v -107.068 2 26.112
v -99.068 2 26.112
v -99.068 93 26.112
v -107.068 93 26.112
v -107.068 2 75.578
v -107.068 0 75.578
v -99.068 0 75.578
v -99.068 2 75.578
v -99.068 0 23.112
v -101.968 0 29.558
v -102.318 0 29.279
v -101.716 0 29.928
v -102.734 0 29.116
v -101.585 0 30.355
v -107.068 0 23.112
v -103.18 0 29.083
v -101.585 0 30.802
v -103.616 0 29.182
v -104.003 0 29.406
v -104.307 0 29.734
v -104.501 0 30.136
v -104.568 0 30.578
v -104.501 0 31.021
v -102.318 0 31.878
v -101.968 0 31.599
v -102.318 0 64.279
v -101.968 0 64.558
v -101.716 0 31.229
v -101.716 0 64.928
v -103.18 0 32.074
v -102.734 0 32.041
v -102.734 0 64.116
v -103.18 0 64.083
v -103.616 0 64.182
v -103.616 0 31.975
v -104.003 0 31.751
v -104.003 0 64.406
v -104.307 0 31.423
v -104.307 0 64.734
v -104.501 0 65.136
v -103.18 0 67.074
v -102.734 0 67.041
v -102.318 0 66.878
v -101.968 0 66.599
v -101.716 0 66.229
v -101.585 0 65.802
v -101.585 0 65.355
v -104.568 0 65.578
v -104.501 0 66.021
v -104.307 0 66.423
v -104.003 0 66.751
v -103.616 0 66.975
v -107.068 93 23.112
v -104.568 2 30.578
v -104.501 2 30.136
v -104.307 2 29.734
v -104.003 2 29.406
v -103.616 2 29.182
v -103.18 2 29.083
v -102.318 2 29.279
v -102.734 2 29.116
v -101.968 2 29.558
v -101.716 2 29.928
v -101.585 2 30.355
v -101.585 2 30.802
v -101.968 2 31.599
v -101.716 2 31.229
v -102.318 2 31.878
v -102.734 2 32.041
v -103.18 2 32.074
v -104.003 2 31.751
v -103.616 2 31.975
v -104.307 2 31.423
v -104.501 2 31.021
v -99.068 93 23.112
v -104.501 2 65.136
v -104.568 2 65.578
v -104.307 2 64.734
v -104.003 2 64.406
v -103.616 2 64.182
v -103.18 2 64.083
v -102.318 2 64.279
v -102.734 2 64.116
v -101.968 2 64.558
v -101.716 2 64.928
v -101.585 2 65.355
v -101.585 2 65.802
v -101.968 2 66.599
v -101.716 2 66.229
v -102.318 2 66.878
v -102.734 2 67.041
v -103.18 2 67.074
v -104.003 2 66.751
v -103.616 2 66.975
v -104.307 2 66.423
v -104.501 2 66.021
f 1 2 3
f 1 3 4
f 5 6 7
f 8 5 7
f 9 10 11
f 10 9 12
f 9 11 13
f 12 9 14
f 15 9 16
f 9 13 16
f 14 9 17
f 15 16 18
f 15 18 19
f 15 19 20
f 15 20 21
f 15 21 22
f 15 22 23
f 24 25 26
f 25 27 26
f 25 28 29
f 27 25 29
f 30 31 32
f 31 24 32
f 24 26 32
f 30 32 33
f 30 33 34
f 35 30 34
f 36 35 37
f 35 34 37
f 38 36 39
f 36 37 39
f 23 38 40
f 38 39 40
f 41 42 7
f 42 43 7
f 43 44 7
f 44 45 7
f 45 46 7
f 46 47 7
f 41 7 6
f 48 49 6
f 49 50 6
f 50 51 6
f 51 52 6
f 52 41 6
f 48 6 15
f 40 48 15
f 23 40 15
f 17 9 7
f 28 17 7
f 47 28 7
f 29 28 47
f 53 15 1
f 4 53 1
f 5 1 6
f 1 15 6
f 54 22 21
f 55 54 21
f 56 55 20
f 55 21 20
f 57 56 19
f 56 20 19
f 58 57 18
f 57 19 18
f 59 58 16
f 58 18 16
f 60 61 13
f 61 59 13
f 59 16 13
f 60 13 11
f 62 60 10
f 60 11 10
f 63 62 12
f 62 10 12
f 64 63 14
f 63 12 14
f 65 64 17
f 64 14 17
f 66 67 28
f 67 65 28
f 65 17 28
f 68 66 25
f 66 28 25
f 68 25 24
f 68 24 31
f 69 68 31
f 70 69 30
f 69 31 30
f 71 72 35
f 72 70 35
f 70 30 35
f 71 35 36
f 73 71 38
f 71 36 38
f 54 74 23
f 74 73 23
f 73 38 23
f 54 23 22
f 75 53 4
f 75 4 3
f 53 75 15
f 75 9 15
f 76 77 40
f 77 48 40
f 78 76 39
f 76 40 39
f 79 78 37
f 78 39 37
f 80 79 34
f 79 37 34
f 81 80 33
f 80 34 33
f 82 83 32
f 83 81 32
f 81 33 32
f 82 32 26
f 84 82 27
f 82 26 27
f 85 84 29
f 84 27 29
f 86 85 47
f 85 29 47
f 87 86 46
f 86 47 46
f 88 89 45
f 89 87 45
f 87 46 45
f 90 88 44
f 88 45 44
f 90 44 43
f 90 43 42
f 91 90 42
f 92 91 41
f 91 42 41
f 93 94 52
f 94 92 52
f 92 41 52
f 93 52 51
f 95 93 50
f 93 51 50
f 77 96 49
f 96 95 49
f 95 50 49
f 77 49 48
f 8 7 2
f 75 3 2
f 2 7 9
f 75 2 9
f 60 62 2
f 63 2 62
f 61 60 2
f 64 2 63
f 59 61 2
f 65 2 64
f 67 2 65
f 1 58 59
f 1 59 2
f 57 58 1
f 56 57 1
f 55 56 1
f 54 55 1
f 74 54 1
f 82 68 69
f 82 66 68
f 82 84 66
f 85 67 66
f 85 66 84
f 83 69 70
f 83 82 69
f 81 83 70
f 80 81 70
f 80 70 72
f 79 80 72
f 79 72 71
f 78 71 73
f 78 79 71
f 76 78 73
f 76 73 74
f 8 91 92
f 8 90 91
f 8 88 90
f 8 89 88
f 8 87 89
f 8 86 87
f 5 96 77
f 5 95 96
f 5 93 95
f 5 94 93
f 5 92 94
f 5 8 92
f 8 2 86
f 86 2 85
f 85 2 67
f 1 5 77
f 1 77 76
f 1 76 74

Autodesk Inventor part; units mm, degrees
ref_plane "YZ Plane" through (0, 0, 0) normal (1, 0, 0) x (0, 1, 0)
ref_plane "XZ Plane" through (0, 0, 0) normal (0, 1, 0) x (-1, 0, 0)
ref_plane "XY Plane" through (0, 0, 0) normal (0, 0, 1) x (1, 0, 0)
sketch "Boceto1" plane through (0, 0, 0) normal (0, 1, 0) x (-1, 0, 0)
  line L0 (112.646, 23.1115) -> (33.646, 23.1115)
  circle A0 centre (89.8586, 65.5785) radius 1.5
  circle A1 centre (89.8586, 65.5785) radius 1.5
  circle A2 centre (103.0678, 65.5785) radius 1.5
  line L1 (103.0678, 65.5785) -> (103.0678, 30.5785)
  circle A3 centre (103.0678, 30.5785) radius 1.5
  line L2 (103.0678, 30.5785) -> (99.0678, 30.5785)
  line L3 (99.0678, 30.5785) -> (99.0678, 25.5785)
  line L4 (99.0678, 25.5785) -> (107.0678, 25.5785)
  line L5 (107.0678, 25.5785) -> (107.0678, 75.5785)
  line L6 (107.0678, 75.5785) -> (99.0678, 75.5785)
  line L7 (99.0678, 75.5785) -> (99.0678, 25.5785)
  point P0 (0, 0)
  dimension "d0" = 35
  dimension "d1" = 3
  dimension "d2" = 4
  dimension "d3" = 5
  dimension "d4" = 8
  dimension "d5" = 50
extrude "Extrusión1" add sketch "Boceto1" along normal blind 2 contours L7 L6 L5 L4 L3
thicken "Engrosado1" operation add thickness 2.467 both sides no extend neighbours yes toward (0, 0, -1) faces at (-101.7345, 0.6667, 25.5785)
sketch "Boceto2" plane through (0, 2, 0) normal (0, 1, 0) x (1, 0, 0)
  line L0 (-99.0678, -23.1115) -> (-107.0678, -23.1115) projected
  line L1 (-99.0678, -75.5785) -> (-99.0678, -23.1115) projected
  line L2 (-107.0678, -23.1115) -> (-99.0678, -23.1115)
  line L3 (-99.0678, -23.1115) -> (-99.0678, -26.1115)
  line L4 (-99.0678, -26.1115) -> (-107.0678, -26.1115)
  line L5 (-107.0678, -26.1115) -> (-107.0678, -23.1115)
  point P0 (0, 0)
  dimension "d10" = 3
extrude "Extrusión2" add sketch "Boceto2" along normal blind 91
properties part number "soporte3pantalla"
